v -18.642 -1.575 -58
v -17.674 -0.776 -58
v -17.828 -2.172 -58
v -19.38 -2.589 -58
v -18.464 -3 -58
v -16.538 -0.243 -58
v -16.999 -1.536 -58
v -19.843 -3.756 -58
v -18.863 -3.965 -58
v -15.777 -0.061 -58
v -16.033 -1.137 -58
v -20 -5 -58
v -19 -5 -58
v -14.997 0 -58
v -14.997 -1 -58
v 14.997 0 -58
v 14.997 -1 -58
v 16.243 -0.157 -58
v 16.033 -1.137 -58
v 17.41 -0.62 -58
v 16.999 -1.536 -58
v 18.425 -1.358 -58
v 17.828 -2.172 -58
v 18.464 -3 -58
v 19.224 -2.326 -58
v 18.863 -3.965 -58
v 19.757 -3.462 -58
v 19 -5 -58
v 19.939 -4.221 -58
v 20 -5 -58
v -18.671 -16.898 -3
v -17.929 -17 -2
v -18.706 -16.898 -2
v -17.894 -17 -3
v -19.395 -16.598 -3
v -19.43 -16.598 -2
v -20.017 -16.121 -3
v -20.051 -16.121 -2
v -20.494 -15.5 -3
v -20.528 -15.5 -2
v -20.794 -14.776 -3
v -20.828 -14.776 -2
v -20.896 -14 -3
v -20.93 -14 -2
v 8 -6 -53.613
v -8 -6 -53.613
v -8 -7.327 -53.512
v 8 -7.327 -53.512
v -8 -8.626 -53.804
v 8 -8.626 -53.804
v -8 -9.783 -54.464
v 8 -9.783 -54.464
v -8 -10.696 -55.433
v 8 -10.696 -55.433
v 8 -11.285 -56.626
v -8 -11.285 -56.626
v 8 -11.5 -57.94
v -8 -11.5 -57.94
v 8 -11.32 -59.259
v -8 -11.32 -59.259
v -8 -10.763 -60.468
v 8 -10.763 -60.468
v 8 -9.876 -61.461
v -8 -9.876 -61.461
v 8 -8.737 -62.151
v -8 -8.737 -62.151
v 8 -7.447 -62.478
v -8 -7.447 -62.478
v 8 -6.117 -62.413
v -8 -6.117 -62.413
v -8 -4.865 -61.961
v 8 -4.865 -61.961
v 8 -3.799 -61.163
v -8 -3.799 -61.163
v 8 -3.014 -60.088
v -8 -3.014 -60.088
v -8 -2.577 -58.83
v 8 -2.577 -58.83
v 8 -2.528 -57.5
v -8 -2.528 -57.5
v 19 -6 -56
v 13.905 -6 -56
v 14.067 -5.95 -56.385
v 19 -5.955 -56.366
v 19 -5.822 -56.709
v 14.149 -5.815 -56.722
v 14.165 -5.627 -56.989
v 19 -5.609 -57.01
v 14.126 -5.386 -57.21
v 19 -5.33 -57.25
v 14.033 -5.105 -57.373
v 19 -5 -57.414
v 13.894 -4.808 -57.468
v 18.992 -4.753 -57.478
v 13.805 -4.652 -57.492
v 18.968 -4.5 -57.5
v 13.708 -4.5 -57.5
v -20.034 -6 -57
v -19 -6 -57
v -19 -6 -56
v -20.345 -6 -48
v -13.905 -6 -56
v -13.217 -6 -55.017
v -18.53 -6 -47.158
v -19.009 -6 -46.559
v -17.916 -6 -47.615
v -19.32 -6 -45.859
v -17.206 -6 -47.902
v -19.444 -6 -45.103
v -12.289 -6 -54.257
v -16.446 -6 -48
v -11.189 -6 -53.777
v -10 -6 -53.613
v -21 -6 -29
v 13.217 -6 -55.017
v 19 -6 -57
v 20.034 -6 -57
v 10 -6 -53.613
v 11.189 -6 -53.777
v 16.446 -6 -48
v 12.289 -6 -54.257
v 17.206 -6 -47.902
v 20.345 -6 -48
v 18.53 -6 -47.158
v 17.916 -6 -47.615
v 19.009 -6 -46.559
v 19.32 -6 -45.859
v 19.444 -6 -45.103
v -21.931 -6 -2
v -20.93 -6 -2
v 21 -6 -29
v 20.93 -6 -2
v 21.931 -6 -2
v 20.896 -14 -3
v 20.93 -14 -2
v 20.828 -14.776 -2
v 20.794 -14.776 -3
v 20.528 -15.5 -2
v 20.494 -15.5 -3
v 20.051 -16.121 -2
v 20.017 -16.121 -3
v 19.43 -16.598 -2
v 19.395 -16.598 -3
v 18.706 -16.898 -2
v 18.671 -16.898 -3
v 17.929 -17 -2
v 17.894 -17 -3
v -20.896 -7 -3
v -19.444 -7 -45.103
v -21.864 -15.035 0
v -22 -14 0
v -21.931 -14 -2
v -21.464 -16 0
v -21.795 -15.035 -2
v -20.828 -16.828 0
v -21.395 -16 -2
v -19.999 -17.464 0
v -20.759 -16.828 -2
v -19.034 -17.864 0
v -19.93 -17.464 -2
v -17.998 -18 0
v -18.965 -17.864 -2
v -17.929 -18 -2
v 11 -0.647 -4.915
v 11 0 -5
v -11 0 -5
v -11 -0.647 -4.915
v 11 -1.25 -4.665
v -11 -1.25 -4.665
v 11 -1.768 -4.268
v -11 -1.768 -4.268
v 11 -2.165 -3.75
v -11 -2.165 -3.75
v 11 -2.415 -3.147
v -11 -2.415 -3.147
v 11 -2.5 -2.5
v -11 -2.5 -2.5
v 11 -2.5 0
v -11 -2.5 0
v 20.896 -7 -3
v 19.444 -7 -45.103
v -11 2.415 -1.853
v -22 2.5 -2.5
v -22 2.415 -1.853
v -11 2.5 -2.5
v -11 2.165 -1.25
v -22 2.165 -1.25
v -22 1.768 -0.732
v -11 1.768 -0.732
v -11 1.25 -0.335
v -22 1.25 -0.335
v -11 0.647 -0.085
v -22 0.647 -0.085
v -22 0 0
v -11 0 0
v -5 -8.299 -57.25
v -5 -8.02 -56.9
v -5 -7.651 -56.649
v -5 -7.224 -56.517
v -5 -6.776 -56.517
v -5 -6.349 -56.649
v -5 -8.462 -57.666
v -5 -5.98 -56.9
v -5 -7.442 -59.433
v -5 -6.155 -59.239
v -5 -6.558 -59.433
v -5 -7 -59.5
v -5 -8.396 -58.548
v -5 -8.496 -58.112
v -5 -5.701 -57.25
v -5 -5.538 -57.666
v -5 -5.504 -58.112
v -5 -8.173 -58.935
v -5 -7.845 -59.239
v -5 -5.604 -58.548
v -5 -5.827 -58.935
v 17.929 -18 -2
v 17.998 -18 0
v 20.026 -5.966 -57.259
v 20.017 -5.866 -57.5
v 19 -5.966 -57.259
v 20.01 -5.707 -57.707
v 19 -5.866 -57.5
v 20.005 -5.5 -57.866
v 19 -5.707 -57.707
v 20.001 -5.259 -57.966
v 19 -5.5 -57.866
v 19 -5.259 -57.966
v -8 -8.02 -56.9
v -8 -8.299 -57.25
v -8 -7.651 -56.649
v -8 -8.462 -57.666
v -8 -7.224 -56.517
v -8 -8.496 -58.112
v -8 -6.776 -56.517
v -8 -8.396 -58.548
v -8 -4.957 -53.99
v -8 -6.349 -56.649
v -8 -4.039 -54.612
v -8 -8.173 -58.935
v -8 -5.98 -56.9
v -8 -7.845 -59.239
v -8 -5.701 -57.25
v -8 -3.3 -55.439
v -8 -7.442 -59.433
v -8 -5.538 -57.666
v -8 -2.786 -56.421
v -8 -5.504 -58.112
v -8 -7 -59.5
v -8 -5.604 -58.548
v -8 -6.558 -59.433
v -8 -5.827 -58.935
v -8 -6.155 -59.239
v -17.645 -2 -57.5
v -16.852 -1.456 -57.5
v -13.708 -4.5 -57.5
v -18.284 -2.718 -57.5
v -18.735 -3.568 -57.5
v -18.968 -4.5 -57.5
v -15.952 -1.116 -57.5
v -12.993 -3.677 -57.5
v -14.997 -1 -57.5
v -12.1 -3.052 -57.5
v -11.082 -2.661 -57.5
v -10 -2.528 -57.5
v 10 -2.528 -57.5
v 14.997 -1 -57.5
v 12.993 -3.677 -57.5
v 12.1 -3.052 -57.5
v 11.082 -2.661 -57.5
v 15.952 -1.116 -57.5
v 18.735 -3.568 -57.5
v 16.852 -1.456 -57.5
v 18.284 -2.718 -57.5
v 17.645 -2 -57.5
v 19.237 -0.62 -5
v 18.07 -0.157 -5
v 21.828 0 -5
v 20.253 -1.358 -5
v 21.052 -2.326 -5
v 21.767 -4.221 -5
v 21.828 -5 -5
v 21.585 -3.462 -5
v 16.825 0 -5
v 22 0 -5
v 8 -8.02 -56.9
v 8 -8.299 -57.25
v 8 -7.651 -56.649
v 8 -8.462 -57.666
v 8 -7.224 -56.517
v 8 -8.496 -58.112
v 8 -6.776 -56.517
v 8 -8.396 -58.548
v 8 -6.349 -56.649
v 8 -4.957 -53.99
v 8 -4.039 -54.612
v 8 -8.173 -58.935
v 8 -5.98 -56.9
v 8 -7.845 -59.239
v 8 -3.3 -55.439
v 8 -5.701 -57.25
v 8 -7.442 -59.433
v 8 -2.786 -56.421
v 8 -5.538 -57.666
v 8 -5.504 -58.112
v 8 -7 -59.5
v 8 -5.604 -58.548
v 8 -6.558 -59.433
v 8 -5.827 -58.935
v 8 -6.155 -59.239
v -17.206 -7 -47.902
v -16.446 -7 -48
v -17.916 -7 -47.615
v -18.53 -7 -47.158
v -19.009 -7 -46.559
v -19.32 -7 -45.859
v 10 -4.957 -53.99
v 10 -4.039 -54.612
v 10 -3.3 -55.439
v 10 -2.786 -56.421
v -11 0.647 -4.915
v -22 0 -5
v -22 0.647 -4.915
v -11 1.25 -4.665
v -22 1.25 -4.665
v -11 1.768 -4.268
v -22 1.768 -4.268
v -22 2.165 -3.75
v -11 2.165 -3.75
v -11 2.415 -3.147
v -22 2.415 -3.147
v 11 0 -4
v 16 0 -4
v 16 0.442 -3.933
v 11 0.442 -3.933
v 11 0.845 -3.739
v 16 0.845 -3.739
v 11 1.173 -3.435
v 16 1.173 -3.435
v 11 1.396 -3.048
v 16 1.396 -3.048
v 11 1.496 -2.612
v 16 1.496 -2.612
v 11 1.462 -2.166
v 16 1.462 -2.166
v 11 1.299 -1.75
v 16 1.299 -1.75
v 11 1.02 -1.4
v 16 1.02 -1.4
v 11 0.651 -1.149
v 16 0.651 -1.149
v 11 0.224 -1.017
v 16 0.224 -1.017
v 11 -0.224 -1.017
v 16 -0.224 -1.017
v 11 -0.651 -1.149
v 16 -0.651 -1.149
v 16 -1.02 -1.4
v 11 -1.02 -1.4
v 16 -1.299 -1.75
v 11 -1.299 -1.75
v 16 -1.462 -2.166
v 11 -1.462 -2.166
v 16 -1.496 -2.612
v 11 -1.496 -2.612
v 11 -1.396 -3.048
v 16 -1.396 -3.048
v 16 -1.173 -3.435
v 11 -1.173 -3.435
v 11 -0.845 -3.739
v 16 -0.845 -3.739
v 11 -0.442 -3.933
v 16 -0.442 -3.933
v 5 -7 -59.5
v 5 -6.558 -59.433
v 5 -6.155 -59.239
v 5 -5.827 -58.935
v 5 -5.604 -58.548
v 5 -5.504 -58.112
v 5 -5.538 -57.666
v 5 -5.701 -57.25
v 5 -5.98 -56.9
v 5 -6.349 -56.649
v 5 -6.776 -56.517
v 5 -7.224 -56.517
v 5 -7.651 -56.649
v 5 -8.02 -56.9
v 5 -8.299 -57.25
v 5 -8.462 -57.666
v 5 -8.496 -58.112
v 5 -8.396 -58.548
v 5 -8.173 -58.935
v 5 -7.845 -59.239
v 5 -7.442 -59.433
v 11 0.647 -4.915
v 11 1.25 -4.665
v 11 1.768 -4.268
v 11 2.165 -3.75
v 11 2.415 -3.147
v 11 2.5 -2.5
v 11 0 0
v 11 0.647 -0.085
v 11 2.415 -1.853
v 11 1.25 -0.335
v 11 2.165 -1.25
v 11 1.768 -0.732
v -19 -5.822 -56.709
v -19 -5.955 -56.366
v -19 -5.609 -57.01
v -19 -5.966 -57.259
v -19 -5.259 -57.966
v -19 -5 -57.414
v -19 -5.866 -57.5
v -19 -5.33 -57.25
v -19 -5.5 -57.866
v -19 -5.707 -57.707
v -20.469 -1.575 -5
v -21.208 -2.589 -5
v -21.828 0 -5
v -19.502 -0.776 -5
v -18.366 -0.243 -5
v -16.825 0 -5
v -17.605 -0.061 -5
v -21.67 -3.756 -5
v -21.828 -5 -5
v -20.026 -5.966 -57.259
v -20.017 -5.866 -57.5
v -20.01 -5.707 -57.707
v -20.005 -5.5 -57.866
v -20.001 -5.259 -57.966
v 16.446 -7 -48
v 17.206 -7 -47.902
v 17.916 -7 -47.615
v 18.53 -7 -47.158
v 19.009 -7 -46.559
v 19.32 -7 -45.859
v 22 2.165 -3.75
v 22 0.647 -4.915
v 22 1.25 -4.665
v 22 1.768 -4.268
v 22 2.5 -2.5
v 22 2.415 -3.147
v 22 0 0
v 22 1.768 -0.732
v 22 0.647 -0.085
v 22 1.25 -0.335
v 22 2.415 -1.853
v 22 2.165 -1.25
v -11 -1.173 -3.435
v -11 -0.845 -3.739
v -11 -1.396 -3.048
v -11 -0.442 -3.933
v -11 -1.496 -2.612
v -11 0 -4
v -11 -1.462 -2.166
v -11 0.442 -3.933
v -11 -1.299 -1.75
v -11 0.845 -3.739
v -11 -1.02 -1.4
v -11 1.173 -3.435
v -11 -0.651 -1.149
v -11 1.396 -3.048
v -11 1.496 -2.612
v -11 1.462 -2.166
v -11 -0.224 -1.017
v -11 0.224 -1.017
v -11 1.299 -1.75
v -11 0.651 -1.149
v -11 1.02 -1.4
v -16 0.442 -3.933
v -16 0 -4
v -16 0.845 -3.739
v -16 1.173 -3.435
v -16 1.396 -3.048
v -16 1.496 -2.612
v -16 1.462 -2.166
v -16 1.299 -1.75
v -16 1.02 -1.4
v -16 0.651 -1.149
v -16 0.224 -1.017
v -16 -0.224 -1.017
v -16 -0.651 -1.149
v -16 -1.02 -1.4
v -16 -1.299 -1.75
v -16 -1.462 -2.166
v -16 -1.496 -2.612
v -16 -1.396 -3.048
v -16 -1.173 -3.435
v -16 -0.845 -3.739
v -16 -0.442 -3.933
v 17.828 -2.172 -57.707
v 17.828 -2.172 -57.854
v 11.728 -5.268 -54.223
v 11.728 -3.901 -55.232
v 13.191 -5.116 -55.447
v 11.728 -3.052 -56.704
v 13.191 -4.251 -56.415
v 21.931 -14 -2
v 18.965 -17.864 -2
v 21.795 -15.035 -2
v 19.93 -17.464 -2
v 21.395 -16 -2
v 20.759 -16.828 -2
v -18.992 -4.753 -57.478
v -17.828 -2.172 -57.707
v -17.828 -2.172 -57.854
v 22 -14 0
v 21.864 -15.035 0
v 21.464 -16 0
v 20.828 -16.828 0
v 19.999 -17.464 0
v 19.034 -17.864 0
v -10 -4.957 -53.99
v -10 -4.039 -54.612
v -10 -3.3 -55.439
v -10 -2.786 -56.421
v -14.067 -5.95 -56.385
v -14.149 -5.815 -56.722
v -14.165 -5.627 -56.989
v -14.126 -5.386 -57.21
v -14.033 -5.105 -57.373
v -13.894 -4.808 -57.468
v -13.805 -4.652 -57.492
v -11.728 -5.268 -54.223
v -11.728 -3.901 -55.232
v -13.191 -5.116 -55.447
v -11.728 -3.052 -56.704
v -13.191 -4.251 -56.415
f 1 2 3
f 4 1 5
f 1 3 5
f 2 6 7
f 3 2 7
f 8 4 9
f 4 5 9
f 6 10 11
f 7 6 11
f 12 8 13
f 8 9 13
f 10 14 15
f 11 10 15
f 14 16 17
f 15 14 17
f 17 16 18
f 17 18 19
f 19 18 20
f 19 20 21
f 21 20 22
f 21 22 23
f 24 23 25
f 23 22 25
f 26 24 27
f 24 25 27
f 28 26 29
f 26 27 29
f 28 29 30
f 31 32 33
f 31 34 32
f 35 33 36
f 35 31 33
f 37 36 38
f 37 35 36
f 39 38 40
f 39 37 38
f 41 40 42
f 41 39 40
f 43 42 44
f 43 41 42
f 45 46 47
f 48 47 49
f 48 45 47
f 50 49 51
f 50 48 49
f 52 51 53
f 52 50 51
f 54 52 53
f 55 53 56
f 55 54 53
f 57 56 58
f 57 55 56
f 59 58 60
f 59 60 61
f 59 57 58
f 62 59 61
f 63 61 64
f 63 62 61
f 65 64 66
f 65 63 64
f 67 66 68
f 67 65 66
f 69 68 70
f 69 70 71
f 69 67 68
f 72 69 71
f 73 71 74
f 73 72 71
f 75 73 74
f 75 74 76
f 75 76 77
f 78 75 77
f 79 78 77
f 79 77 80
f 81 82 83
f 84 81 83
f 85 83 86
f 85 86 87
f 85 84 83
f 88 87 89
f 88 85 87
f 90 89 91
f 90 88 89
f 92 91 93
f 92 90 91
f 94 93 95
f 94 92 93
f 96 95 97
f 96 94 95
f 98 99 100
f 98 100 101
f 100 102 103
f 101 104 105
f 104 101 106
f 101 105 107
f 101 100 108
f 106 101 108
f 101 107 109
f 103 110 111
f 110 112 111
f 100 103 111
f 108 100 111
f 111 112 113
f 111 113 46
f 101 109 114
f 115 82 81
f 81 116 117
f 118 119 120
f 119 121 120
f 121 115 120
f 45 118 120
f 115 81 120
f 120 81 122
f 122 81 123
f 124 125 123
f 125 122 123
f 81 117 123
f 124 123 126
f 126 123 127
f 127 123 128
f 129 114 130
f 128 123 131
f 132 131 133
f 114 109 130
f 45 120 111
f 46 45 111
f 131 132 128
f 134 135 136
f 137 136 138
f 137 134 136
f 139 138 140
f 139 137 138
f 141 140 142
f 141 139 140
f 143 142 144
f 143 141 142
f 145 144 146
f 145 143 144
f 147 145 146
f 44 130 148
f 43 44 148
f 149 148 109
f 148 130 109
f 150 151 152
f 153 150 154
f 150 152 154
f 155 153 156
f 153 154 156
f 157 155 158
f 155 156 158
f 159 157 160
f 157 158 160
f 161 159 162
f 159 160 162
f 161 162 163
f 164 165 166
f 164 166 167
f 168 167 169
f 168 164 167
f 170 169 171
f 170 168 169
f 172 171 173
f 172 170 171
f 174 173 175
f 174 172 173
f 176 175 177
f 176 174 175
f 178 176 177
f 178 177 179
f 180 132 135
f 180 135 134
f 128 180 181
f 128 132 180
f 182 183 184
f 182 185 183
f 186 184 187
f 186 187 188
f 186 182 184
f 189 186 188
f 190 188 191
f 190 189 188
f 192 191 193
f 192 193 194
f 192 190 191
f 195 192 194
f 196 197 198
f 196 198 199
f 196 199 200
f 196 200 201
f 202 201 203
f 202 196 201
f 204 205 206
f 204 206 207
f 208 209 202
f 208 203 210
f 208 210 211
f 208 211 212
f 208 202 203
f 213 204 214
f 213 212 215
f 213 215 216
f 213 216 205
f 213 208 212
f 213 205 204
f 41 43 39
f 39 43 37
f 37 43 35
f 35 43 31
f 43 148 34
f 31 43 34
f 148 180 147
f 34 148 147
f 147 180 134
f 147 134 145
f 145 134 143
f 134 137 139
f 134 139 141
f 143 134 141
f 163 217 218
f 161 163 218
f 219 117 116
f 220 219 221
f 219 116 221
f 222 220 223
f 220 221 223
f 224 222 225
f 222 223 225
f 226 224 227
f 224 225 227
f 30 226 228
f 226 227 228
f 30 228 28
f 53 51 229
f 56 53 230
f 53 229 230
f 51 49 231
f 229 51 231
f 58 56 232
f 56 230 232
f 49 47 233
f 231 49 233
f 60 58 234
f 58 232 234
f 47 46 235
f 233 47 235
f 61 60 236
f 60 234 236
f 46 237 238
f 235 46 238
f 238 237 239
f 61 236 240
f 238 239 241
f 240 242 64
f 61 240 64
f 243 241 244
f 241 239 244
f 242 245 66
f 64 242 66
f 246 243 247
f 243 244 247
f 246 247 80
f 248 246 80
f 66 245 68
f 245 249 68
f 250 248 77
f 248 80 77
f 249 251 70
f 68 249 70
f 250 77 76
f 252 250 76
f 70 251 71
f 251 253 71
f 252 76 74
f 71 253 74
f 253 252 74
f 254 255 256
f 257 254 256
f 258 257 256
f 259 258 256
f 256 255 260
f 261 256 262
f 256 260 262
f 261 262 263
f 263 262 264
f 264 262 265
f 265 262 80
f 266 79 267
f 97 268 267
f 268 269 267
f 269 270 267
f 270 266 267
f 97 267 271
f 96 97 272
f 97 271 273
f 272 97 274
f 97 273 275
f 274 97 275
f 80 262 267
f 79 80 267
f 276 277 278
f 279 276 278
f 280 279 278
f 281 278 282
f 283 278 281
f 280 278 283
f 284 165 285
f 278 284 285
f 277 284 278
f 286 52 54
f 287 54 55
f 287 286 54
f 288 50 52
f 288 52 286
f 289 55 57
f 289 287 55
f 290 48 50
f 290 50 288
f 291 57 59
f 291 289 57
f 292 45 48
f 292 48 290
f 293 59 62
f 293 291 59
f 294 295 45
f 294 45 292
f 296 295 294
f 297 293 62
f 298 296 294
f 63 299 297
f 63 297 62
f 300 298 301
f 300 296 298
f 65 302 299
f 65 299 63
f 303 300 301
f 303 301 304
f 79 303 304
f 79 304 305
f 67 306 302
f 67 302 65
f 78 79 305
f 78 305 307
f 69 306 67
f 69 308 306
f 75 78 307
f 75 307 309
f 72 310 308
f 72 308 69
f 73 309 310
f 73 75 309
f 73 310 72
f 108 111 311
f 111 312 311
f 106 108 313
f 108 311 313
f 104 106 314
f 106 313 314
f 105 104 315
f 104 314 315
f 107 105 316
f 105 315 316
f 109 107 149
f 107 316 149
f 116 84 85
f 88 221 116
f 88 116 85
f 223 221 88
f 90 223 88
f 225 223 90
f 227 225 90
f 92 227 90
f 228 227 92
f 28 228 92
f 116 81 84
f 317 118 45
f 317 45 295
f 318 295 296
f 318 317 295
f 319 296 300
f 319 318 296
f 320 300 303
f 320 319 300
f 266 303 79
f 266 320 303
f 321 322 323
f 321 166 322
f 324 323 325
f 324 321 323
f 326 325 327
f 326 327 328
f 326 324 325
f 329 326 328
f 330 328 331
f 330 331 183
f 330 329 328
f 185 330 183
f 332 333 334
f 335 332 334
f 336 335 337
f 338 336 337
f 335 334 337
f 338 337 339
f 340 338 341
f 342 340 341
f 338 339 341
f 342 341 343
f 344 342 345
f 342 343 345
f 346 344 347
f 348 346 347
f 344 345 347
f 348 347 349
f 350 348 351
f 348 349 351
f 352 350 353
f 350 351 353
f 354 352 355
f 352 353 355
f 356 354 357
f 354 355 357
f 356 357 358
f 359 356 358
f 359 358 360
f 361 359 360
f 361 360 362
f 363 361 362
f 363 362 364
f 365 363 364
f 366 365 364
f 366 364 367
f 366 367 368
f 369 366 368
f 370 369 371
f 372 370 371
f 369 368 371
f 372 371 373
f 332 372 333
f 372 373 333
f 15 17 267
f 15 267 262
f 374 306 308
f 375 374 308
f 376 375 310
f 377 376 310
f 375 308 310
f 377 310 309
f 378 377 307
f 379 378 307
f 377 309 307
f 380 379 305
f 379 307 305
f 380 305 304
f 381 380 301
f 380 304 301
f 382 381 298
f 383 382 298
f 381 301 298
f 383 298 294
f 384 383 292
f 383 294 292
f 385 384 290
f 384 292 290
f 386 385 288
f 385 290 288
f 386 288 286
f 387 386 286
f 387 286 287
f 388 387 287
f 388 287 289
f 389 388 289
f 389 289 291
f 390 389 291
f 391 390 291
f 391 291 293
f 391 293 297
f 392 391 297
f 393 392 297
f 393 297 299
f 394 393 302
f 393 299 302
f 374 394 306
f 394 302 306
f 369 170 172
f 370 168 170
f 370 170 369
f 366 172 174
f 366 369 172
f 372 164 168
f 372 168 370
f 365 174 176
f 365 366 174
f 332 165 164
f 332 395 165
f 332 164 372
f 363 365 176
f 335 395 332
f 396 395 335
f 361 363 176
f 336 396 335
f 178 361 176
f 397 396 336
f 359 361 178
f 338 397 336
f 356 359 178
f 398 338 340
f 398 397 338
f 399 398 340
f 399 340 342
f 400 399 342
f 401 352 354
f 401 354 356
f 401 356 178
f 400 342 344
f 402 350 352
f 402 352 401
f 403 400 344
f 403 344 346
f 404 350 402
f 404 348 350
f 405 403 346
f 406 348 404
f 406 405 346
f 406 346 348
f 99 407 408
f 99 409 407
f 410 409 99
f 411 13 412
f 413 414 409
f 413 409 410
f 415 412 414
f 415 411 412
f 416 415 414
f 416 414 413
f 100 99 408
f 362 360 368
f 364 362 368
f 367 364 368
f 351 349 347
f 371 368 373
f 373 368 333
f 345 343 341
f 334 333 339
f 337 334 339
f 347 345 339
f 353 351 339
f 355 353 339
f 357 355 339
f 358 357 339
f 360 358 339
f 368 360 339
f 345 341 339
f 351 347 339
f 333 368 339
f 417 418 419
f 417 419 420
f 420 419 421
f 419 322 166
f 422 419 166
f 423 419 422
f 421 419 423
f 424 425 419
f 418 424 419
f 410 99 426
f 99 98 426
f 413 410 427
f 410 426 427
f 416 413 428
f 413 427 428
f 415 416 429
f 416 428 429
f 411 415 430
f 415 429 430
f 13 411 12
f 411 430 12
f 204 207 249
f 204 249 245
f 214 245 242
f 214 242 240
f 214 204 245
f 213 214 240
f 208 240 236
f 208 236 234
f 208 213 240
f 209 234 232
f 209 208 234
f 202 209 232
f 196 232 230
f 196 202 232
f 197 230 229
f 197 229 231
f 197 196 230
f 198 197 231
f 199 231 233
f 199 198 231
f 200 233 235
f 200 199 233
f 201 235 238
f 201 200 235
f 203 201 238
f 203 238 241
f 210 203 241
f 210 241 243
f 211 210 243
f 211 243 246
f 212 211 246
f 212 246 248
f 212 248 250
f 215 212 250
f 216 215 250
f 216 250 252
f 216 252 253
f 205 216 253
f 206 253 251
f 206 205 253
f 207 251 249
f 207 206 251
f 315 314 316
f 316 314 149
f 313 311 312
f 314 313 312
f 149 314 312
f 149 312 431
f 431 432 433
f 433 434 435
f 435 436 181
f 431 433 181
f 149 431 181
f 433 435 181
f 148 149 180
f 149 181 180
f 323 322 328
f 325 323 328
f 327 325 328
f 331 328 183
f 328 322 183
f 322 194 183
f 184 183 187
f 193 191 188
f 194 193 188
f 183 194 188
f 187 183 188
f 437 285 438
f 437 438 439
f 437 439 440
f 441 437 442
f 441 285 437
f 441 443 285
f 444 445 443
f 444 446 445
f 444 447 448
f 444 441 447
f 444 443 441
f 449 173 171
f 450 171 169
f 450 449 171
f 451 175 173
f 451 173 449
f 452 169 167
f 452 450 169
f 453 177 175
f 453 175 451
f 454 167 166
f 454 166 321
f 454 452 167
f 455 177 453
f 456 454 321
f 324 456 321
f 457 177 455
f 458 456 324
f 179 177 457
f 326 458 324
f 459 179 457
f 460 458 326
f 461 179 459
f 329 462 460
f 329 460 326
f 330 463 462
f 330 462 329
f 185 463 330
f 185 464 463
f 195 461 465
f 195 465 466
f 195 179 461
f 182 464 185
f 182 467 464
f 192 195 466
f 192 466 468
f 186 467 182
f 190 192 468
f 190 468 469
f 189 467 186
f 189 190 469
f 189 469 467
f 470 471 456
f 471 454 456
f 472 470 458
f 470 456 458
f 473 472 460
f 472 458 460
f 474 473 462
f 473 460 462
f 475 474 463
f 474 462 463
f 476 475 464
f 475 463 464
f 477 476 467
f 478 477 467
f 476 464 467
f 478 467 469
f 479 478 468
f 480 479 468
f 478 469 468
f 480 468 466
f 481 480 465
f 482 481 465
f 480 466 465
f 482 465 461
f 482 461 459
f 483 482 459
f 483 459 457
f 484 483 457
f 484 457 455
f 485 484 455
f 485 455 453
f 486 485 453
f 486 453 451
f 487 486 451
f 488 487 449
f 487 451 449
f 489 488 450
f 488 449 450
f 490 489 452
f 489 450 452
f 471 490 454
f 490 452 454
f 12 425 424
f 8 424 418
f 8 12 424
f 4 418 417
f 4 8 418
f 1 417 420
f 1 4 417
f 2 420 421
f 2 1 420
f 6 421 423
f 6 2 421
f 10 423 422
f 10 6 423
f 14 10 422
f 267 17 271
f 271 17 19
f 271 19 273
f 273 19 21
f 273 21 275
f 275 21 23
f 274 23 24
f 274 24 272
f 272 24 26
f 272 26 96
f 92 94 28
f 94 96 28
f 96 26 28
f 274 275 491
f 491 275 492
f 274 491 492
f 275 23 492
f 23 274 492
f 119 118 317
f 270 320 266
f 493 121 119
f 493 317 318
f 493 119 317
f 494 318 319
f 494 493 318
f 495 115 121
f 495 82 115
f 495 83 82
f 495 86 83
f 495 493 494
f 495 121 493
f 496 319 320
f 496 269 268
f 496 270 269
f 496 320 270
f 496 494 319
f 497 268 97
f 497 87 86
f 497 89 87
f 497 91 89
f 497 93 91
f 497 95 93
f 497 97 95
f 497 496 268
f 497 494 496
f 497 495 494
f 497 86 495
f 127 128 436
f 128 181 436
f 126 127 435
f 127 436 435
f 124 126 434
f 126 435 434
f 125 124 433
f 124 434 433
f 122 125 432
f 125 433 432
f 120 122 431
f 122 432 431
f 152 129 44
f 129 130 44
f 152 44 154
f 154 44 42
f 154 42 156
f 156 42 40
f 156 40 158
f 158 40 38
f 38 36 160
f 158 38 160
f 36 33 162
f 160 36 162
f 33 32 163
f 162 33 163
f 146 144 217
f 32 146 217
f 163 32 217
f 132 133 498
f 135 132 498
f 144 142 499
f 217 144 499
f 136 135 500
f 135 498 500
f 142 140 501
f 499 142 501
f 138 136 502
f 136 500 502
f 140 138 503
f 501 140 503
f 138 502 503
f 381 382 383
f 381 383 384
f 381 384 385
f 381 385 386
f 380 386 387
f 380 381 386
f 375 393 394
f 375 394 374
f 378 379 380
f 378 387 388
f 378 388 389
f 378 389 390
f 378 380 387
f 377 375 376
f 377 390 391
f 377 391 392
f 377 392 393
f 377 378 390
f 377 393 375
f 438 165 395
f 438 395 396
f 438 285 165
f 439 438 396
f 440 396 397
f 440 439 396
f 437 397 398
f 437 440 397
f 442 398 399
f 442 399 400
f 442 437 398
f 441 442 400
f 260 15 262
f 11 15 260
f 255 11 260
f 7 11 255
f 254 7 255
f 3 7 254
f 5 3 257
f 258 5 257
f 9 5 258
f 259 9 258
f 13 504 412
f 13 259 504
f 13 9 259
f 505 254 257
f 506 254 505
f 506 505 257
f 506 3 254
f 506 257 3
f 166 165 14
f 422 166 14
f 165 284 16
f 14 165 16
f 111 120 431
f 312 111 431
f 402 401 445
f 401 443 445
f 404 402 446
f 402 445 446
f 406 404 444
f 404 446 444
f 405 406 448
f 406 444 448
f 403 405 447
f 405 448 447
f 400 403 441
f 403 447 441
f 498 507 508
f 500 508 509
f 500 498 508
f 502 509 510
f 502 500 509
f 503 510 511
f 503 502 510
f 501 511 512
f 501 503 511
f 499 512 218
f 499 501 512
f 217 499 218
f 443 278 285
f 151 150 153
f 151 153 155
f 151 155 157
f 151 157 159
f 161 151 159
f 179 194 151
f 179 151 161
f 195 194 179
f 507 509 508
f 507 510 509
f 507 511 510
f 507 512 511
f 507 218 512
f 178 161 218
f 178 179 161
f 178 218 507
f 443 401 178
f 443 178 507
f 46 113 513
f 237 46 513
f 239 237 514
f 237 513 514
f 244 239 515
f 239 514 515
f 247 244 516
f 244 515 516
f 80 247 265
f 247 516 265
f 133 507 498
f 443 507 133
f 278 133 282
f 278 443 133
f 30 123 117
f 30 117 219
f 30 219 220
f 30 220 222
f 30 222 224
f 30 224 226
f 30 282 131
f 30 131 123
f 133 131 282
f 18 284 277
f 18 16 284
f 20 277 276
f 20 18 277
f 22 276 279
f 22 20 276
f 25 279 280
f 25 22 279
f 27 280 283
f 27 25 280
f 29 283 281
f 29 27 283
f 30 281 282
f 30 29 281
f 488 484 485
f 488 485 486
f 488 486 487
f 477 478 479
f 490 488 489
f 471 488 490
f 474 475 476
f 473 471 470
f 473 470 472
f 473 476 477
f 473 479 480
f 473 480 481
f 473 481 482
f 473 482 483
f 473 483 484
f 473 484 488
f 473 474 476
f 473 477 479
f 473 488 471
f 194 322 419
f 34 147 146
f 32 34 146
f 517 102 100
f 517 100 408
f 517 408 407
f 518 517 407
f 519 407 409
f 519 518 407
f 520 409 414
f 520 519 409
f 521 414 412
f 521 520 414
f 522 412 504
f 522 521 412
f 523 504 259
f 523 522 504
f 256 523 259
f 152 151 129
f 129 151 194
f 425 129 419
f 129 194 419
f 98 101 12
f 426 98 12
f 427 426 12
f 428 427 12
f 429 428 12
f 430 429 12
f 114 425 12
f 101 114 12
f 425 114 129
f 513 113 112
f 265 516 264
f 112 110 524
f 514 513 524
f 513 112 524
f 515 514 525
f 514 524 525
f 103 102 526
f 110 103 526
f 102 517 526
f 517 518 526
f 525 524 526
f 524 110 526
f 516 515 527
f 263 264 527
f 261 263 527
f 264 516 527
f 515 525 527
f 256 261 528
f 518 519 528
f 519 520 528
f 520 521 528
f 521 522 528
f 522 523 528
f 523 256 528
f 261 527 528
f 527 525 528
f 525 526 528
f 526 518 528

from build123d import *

# Parameters (mm, degrees)
EXTRUDE_1_DEPTH     = 22
EXTRUDE_2_DEPTH     = 21
CUT_EXTRUDE_1_REACH = 66.591
CUT_EXTRUDE_2_DEPTH = 11
FILLET_2_R          = 3
FILLET_3_R          = 4
SKETCH_6_W          = 11
SKETCH_6_H          = 2.5
EXTRUDE_6_DEPTH     = 5
FILLET_4_R          = 5
FILLET_5_R          = 2.5
SKETCH_7_R          = 1.5
CUT_EXTRUDE_3_DEPTH = 16
CUT_EXTRUDE_4_DEPTH = 11
CUT_EXTRUDE_5_DEPTH = 0.5
FILLET_7_R          = 1.5
FILLET_8_R          = 1
SKETCH_10_R         = 4.5
EXTRUDE_7_DEPTH     = 8
SKETCH_11_R         = 1.5
CUT_EXTRUDE_6_DEPTH = 3
CUT_EXTRUDE_START   = -3
SKETCH_12_R         = 1.5
CUT_EXTRUDE_7_DEPTH = 3


with BuildPart() as part:
    # Эскиз1 → Бобышка-Вытянуть1 (new, symmetric)
    with BuildSketch(Plane(origin=(0, 0, 0), x_dir=(0, 0, -1), z_dir=(1, 0, 0))):
        Polygon((0, -18), (0, 0), (58, 0), (58, -6), (2, -6), (2, -18), align=None)
    extrude(amount=EXTRUDE_1_DEPTH, both=True)

    # Эскиз2 → Бобышка-Вытянуть2 (add, symmetric)
    with BuildSketch(Plane(origin=(0, 0, 0), x_dir=(0, 0, -1), z_dir=(1, 0, 0))):
        Polygon((2, -6), (48, -6), (48, -7), (3, -7), (3, -17), (2, -17), align=None)
    extrude(amount=EXTRUDE_2_DEPTH, both=True)

    # Вырез-Вытянуть1: up to this face of the body (flat: up to its plane)
    cut_extrude_1_end = Plane(part.part.faces().sort_by_distance((0, -18, -1))[0])
    # Эскиз3 → Вырез-Вытянуть1 (cut, up to the picked face)
    with BuildSketch(Plane(origin=(0, 0, 0), x_dir=(1, 0, 0), z_dir=(0, 1, 0)), mode=Mode.PRIVATE) as cut_extrude_1_sk1:
        Polygon((-20, 58), (-22, 58), (-22, 0), align=None)
    cut_extrude_1_tool1 = split(extrude(cut_extrude_1_sk1.sketch, amount=-CUT_EXTRUDE_1_REACH, mode=Mode.PRIVATE), bisect_by=cut_extrude_1_end, keep=Keep.BOTH, mode=Mode.PRIVATE)
    # Эскиз3 → Вырез-Вытянуть1 (cut, up to the picked face)
    with BuildSketch(Plane(origin=(0, 0, 0), x_dir=(1, 0, 0), z_dir=(0, 1, 0)), mode=Mode.PRIVATE) as cut_extrude_1_sk2:
        Polygon((22, 58), (22, 0), (20, 58), align=None)
    cut_extrude_1_tool2 = split(extrude(cut_extrude_1_sk2.sketch, amount=-CUT_EXTRUDE_1_REACH, mode=Mode.PRIVATE), bisect_by=cut_extrude_1_end, keep=Keep.BOTH, mode=Mode.PRIVATE)
    add(cut_extrude_1_tool1.solids().sort_by(Axis((-21.333333, 0, -38.666667), (0, -1, 0)))[0], mode=Mode.SUBTRACT)
    add(cut_extrude_1_tool2.solids().sort_by(Axis((21.333333, 0, -38.666667), (0, -1, 0)))[0], mode=Mode.SUBTRACT)

    # Эскиз4 → Вырез-Вытянуть2 (cut)
    with BuildSketch(Plane.XZ.offset(6)):
        Polygon((-20.930440129, -2), (-19.344233233, -48), (-20.344827586, -48), (-21.931034483, -2), align=None)
        Polygon((19.344233233, -48), (20.344827586, -48), (21.931034483, -2), (20.930440129, -2), align=None)
    extrude(amount=CUT_EXTRUDE_2_DEPTH, mode=Mode.SUBTRACT)

    # Скругление2
    fillet_2_edges = [part.edges().sort_by_distance(p)[0] for p in [
        (19.344233233, -6.5, -48),
        (-19.344233233, -6.5, -48),
        (-20.91319875, -17, -2.5),
        (20.91319875, -17, -2.5),
    ]]
    fillet(fillet_2_edges, radius=FILLET_2_R)

    # Скругление3
    fillet_3_edges = [part.edges().sort_by_distance(p)[0] for p in [
        (-21.965517241, -18, -1),
        (21.965517241, -18, -1),
    ]]
    fillet(fillet_3_edges, radius=FILLET_3_R)

    # Эскиз6 → Бобышка-Вытянуть6 (add)
    with BuildSketch(Plane.XY):
        with Locations((-16.5, 1.25)):
            Rectangle(SKETCH_6_W, SKETCH_6_H)
        with Locations((16.5, 1.25)):
            Rectangle(SKETCH_6_W, SKETCH_6_H)
    extrude(amount=-EXTRUDE_6_DEPTH)

    # Скругление4
    fillet_4_edges = [part.edges().sort_by_distance(p)[0] for p in [
        (-20.913793103, 0, -31.5),
        (20.913793103, 0, -31.5),
    ]]
    fillet(fillet_4_edges, radius=FILLET_4_R)

    # Скругление5
    fillet_5_edges = [part.edges().sort_by_distance(p)[0] for p in [
        (-16.5, 2.5, -5),
        (-16.5, 2.5, 0),
        (16.5, 2.5, -5),
        (16.5, 2.5, 0),
    ]]
    fillet(fillet_5_edges, radius=FILLET_5_R - 0.0001)  # a hair under: the kernel refuses the full size

    # Эскиз7 → Вырез-Вытянуть3 (cut, symmetric)
    with BuildSketch(Plane(origin=(0, 0, 0), x_dir=(0, 0, -1), z_dir=(1, 0, 0))):
        with Locations((2.5, 0)):
            Circle(SKETCH_7_R)
    extrude(amount=CUT_EXTRUDE_3_DEPTH, both=True, mode=Mode.SUBTRACT)

    # Эскиз8 → Вырез-Вытянуть4 (cut, symmetric)
    with BuildSketch(Plane(origin=(0, 0, 0), x_dir=(0, 0, -1), z_dir=(1, 0, 0))):
        with BuildLine():
            Line((2.5, -2.5), (0, -2.5))
            Line((0, -2.5), (0, 0))
            ThreePointArc((0, 0), (4.267766953, 1.767766953), (2.5, -2.5))
        make_face()
    extrude(amount=CUT_EXTRUDE_4_DEPTH, both=True, mode=Mode.SUBTRACT)

    # Эскиз9 → Вырез-Вытянуть5 (cut)
    with BuildSketch(Plane(origin=(0, 0, -58), x_dir=(-1, 0, 0), z_dir=(0, 0, -1))):
        with BuildLine():
            Line((-14.997028232, -1), (14.997028232, -1))
            add(Edge.make_bspline(
                [(14.997028232, -1), (15.521093765, -1), (16.044951376, -1.104143211), (17.013235139, -1.504981238), (17.457278985, -1.801515154), (18.198254652, -2.542050681), (18.494897371, -2.985758471), (18.895847322, -3.953162299), (19, -4.476479025), (19, -5)],
                knots=[0, 0, 0, 0, 0.25, 0.25, 0.5, 0.5, 0.75, 0.75, 1, 1, 1, 1], degree=3))
            Line((19, -5), (19, -6))
            Line((19, -6), (-19, -6))
            Line((-19, -6), (-19, -5))
            add(Edge.make_bspline(
                [(-14.997028232, -1), (-15.521093765, -1), (-16.044951376, -1.104143211), (-17.013235139, -1.504981238), (-17.457278985, -1.801515154), (-18.198254652, -2.542050681), (-18.494897371, -2.985758471), (-18.895847322, -3.953162299), (-19, -4.476479025), (-19, -5)],
                knots=[0, 0, 0, 0, 0.25, 0.25, 0.5, 0.5, 0.75, 0.75, 1, 1, 1, 1], degree=3))
        make_face()
    extrude(amount=-CUT_EXTRUDE_5_DEPTH, mode=Mode.SUBTRACT)

    # Скругление7
    fillet_7_edges = [part.edges().sort_by_distance(p)[0] for p in [
        (0, -6, -57.5),
    ]]
    fillet(fillet_7_edges, radius=FILLET_7_R)

    # Скругление8
    fillet_8_edges = [part.edges().sort_by_distance(p)[0] for p in [
        (-19.5, -6, -58),
        (19.5, -6, -58),
    ]]
    fillet(fillet_8_edges, radius=FILLET_8_R)

    # Эскиз10 → Бобышка-Вытянуть7 (add, symmetric)
    with BuildSketch(Plane(origin=(0, 0, 0), x_dir=(0, 0, -1), z_dir=(1, 0, 0))):
        with Locations((58, -7)):
            Circle(SKETCH_10_R)
    extrude(amount=EXTRUDE_7_DEPTH, both=True)

    # Эскиз11 → Вырез-Вытянуть6 (cut)
    with BuildSketch(Plane(origin=(8, 0, 0), x_dir=(0, 0, -1), z_dir=(1, 0, 0))):
        with Locations((58, -7)):
            Circle(SKETCH_11_R)
    extrude(amount=-CUT_EXTRUDE_6_DEPTH, mode=Mode.SUBTRACT)

    # Эскиз12 → Вырез-Вытянуть7 (cut)
    with BuildSketch(Plane.ZY.offset(8).offset(CUT_EXTRUDE_START)):
        with Locations(Location((-58, -7, 0), (0, 0, 180))):
            Circle(SKETCH_12_R)
    extrude(amount=CUT_EXTRUDE_7_DEPTH, mode=Mode.SUBTRACT)

    # Эскиз13 → Вырез-Повернуть1 (revolve, cut)
    with BuildSketch(Plane(origin=(0, -7, 0), x_dir=(-1, 0, 0), z_dir=(0, 1, 0)), mode=Mode.PRIVATE) as cut_revolve_1_sk:
        with BuildLine():
            Line((-14.5, -58), (-8, -58))
            Line((-8, -58), (-8, -62.5))
            Line((-8, -62.5), (-10, -62.5))
            ThreePointArc((-10, -62.5), (-13.181980515, -61.181980515), (-14.5, -58))
        make_face()
        with BuildLine():
            Line((8, -58), (8, -62.5))
            Line((8, -62.5), (10, -62.5))
            ThreePointArc((10, -62.5), (13.181980515, -61.181980515), (14.5, -58))
            Line((14.5, -58), (8, -58))
        make_face()
    revolve(cut_revolve_1_sk.sketch.rotate(Axis((21.094367923, -7, -58), (-1, 0, 0)), 180), axis=Axis((21.094367923, -7, -58), (-1, 0, 0)), mode=Mode.SUBTRACT)


solid = part.part
